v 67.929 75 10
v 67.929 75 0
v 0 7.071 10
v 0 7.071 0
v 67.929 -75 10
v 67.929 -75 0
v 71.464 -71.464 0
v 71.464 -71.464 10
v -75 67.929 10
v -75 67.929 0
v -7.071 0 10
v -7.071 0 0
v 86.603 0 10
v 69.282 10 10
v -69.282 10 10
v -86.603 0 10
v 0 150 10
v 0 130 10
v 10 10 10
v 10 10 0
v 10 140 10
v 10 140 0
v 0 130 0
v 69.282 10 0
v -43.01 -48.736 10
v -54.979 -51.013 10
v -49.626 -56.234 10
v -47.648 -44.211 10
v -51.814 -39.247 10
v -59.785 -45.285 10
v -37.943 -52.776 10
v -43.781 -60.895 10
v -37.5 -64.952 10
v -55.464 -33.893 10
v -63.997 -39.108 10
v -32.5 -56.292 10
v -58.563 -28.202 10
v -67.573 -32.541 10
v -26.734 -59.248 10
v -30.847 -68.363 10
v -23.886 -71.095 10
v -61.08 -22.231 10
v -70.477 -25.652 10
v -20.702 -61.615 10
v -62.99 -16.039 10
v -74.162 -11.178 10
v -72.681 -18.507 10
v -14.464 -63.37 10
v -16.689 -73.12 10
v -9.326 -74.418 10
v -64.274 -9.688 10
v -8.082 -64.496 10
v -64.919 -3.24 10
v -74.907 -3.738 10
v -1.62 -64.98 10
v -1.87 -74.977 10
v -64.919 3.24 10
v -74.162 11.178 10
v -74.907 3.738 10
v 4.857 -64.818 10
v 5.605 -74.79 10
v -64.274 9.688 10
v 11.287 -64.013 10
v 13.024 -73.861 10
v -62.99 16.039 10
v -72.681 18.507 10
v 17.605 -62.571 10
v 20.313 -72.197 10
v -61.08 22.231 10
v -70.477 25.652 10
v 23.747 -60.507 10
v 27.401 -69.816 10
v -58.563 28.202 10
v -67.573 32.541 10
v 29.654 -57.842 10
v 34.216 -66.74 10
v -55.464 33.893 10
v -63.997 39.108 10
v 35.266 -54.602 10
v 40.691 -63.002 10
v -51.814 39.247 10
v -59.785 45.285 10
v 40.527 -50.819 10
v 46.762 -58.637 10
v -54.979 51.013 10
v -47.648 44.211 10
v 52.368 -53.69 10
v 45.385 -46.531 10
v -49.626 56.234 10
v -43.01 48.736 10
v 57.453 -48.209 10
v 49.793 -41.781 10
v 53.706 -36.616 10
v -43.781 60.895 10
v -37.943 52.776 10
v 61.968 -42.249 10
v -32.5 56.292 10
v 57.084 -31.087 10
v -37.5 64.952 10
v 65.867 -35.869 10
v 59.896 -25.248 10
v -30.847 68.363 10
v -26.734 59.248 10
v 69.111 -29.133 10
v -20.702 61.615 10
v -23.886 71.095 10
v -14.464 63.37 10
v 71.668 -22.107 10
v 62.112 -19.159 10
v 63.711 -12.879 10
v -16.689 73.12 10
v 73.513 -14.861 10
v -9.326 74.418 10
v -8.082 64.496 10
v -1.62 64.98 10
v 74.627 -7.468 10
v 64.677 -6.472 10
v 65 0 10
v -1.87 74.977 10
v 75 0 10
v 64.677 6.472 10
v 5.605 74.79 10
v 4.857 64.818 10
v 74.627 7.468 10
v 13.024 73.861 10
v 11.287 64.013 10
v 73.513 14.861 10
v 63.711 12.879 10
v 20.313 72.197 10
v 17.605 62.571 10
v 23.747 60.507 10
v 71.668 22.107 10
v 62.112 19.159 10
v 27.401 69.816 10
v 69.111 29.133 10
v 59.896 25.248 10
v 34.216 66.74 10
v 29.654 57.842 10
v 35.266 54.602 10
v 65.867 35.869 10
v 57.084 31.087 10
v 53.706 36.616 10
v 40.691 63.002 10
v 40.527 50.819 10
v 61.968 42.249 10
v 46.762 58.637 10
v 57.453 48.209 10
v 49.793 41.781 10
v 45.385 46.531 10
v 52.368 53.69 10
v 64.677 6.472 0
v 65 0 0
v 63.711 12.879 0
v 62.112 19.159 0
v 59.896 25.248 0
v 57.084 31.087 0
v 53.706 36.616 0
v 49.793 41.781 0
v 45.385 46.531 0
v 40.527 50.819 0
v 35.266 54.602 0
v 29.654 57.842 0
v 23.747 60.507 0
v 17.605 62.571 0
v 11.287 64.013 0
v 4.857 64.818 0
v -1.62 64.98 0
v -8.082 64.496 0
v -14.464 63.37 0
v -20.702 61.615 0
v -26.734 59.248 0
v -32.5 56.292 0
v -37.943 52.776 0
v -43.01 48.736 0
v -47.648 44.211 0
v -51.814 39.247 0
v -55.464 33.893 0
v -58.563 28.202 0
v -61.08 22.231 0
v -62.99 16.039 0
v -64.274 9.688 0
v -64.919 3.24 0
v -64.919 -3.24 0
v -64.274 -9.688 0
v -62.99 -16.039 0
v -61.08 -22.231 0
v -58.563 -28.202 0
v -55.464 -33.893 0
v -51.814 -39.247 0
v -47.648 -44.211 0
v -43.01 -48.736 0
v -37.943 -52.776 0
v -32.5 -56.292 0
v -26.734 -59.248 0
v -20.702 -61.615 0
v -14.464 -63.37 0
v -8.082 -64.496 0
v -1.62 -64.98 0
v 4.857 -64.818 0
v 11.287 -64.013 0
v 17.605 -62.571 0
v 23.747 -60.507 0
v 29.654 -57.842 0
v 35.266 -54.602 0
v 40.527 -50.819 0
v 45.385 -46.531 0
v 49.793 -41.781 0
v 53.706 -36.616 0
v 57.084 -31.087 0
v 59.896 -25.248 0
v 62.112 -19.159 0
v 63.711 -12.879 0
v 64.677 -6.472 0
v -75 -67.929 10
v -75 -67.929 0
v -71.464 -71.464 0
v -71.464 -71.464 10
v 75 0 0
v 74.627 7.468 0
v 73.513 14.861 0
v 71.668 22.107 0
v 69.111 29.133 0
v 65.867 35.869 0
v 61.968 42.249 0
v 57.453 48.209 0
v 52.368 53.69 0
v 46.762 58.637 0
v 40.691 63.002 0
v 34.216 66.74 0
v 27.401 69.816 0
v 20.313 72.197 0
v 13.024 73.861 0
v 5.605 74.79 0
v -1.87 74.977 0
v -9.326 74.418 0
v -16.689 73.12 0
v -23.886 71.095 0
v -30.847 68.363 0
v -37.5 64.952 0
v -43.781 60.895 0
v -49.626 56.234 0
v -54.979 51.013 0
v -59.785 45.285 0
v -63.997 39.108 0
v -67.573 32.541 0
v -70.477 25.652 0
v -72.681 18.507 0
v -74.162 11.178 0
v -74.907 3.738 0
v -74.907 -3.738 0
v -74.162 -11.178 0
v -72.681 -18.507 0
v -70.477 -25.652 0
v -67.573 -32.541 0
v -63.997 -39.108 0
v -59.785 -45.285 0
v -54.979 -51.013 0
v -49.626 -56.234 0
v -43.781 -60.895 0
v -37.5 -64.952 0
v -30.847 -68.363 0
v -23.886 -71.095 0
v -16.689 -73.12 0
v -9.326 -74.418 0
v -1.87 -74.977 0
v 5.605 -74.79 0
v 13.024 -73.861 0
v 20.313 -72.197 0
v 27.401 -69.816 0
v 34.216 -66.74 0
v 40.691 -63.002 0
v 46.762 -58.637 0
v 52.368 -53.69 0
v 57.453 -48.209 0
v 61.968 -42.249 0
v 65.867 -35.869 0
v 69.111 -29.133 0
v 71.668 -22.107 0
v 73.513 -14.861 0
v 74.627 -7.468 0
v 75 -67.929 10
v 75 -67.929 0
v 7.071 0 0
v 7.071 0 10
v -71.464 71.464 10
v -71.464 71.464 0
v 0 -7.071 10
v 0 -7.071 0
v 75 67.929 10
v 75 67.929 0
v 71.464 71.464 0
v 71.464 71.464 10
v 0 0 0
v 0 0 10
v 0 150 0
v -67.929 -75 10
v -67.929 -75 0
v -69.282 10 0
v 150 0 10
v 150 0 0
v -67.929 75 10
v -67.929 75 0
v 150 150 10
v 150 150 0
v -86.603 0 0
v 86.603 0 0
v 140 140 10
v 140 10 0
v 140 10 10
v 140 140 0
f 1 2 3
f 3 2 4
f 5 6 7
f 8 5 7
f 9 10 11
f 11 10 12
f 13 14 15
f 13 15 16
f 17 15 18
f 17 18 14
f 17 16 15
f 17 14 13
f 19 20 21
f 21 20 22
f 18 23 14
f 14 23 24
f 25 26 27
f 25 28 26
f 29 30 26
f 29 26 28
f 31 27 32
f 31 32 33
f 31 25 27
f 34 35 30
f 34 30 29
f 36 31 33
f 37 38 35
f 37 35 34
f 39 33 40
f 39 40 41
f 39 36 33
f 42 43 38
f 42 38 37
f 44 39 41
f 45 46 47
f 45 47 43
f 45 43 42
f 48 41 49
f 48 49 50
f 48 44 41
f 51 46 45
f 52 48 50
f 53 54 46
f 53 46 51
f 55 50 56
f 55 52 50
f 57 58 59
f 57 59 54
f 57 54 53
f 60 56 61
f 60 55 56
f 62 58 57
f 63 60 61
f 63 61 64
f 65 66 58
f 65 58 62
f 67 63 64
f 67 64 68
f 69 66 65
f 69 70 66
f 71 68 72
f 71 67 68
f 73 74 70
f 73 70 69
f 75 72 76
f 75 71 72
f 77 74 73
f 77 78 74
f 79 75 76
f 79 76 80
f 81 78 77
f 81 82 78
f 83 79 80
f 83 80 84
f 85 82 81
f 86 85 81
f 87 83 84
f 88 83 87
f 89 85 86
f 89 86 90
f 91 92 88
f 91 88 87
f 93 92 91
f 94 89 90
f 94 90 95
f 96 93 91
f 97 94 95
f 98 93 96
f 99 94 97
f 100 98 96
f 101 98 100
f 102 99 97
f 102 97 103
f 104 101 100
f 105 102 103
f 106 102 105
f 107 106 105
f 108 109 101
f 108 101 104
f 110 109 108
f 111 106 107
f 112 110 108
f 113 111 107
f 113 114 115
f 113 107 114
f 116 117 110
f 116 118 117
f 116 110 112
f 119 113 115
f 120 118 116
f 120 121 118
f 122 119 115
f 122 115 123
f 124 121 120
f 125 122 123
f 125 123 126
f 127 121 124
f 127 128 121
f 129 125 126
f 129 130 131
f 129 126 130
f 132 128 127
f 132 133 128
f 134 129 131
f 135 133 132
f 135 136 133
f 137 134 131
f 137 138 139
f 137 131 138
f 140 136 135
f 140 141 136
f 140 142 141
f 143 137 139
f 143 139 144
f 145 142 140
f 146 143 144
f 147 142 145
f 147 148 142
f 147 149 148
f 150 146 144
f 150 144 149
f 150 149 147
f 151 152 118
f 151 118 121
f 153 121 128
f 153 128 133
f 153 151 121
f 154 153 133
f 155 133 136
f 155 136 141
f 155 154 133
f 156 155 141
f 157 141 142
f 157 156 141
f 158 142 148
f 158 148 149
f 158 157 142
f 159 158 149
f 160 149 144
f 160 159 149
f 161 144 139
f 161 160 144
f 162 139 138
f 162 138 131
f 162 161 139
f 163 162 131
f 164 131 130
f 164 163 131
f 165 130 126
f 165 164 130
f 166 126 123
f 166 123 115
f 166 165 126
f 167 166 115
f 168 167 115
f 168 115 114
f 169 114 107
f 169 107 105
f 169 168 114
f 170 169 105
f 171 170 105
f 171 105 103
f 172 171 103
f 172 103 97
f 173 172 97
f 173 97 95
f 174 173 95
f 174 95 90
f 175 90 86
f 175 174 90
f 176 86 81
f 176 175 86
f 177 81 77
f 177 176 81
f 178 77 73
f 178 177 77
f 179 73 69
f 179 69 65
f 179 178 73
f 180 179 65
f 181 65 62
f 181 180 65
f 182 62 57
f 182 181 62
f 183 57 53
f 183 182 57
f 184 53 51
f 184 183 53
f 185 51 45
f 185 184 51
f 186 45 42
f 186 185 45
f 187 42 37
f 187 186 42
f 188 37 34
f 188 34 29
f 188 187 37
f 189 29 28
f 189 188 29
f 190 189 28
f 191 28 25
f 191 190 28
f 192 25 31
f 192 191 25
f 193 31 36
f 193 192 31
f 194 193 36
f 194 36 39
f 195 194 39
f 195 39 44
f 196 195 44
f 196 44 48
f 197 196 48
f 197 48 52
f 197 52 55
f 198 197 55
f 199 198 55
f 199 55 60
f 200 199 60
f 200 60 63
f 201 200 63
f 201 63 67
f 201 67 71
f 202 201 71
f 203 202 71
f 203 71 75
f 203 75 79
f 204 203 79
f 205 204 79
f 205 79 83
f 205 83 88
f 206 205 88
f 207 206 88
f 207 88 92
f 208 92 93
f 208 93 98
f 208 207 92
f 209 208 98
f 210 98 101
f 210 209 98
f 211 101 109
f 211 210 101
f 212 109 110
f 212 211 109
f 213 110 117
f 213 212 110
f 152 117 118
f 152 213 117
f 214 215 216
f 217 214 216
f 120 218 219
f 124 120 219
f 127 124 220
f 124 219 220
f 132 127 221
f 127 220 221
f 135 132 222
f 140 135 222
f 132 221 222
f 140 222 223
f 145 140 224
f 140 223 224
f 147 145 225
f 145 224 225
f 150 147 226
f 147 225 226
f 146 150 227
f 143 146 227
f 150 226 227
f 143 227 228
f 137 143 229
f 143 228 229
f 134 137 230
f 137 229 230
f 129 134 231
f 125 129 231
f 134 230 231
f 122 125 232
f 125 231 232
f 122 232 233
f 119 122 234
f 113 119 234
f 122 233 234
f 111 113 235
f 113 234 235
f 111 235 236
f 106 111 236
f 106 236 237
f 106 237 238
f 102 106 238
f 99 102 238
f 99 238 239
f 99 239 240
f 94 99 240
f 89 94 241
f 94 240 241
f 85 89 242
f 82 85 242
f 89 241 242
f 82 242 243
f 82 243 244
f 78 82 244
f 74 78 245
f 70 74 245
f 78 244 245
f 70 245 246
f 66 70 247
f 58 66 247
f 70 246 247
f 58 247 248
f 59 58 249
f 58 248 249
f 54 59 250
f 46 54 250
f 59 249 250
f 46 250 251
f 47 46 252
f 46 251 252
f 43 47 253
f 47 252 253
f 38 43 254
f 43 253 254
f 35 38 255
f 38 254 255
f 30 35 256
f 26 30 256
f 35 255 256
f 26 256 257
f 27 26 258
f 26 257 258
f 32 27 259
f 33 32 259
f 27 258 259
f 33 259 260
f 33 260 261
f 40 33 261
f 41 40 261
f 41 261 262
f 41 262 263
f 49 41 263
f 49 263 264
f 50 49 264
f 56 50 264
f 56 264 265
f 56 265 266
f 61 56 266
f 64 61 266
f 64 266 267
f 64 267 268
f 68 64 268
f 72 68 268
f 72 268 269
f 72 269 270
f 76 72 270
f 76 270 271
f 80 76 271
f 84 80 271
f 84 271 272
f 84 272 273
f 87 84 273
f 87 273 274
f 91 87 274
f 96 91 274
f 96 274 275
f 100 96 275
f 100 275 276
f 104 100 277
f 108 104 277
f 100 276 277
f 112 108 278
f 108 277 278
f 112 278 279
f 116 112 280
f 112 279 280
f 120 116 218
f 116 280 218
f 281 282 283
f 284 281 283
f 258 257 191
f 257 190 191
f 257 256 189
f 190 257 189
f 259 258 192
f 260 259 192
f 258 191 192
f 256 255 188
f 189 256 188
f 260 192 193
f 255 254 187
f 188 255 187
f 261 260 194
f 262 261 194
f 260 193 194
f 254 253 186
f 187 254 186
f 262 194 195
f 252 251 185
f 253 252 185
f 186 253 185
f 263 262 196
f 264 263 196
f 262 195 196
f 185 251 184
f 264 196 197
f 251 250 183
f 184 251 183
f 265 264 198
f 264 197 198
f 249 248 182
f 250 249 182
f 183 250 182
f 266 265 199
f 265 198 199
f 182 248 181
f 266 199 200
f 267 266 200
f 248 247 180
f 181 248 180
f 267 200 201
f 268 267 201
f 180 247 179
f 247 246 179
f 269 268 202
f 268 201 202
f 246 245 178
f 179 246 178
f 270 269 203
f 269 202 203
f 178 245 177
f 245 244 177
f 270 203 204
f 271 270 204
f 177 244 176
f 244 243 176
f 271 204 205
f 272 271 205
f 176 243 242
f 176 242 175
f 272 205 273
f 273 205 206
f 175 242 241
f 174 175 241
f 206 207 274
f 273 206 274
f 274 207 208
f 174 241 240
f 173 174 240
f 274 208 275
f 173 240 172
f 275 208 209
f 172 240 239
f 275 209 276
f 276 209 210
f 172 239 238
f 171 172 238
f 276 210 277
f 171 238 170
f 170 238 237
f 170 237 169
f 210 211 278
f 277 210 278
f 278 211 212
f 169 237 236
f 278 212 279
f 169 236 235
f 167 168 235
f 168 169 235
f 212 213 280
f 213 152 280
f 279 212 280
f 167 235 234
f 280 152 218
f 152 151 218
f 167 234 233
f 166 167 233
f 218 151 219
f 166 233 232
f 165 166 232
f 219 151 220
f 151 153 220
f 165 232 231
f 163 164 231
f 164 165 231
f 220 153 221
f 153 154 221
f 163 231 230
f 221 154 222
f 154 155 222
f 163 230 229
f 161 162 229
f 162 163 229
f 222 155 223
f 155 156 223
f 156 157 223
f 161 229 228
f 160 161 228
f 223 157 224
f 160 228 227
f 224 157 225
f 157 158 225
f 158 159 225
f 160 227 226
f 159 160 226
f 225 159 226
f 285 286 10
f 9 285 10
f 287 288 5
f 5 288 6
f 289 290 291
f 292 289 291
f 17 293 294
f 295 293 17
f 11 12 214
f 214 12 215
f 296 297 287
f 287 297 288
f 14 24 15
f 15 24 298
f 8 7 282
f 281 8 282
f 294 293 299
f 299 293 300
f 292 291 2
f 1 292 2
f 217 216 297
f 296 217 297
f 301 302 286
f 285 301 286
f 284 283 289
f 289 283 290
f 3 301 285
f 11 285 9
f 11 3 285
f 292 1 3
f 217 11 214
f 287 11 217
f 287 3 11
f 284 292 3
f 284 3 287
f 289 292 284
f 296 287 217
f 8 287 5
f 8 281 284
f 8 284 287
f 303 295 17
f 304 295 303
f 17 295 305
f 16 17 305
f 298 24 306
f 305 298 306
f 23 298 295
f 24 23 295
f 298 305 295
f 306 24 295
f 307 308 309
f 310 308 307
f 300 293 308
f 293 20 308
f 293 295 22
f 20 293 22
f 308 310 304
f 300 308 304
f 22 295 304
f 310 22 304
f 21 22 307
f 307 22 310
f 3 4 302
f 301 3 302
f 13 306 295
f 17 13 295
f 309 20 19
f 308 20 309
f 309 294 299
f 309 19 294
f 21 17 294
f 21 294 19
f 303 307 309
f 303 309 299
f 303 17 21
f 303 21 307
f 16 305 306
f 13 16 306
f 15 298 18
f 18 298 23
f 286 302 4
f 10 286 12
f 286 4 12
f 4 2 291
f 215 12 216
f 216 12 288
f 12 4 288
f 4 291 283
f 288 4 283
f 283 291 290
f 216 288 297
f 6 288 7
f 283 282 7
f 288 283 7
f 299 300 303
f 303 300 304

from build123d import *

# Parameters (mm, degrees)
F0_W     = 150
F0_H     = 150
F0_W_2   = 130
F0_H_2   = 130
F1_DEPTH = 10
F3_R     = 75
F3_R_2   = 65
F4_DEPTH = 10
F5_DEPTH = 10
F7_DEPTH = 10
F9_COUNT = 4


with BuildPart() as f1:
    # F0 (on Top) → F1 (new body)
    with BuildSketch(Plane.XY):
        with Locations((75, 75)):
            Rectangle(F0_W, F0_H)
        with Locations((75, 75)):
            Rectangle(F0_W_2, F0_H_2, mode=Mode.SUBTRACT)
    extrude(amount=F1_DEPTH)


with BuildPart() as f4:
    # F3 (on Top) → F4 (new body)
    with BuildSketch(Plane.XY):
        Circle(F3_R)
        Circle(F3_R_2, mode=Mode.SUBTRACT)
    extrude(amount=F4_DEPTH)


with BuildPart() as f5:
    # F2 (on Top) → F5 (new body)
    with BuildSketch(Plane.XY):
        Polygon((86.6025403784, 0), (0, 150), (-86.6025403784, 0), align=None)
        Polygon((-69.2820323028, 10), (0, 130), (69.2820323028, 10), align=None, mode=Mode.SUBTRACT)
    extrude(amount=F5_DEPTH)


with BuildPart() as f7:
    # F6 (on Top) → F7 (new body)
    with BuildSketch(Plane.XY):
        Polygon((75, 67.9289321881), (71.4644660941, 71.4644660941), (67.9289321881, 75), (-3.5355339059, 3.5355339059), (0, 0), (3.5355339059, -3.5355339059), align=None)
    extrude(amount=F7_DEPTH)

    # F9: F7 ×4 about axis
    f9_axis = Axis((0, 0, 5), (0, 0, 1))


with BuildPart() as f7_1:
    add(f7.part)
    for i in range(1, F9_COUNT):
        add(f7.part.rotate(f9_axis, i * 360 / F9_COUNT))


solid = Compound([f1.part, f4.part, f5.part, f7_1.part])
